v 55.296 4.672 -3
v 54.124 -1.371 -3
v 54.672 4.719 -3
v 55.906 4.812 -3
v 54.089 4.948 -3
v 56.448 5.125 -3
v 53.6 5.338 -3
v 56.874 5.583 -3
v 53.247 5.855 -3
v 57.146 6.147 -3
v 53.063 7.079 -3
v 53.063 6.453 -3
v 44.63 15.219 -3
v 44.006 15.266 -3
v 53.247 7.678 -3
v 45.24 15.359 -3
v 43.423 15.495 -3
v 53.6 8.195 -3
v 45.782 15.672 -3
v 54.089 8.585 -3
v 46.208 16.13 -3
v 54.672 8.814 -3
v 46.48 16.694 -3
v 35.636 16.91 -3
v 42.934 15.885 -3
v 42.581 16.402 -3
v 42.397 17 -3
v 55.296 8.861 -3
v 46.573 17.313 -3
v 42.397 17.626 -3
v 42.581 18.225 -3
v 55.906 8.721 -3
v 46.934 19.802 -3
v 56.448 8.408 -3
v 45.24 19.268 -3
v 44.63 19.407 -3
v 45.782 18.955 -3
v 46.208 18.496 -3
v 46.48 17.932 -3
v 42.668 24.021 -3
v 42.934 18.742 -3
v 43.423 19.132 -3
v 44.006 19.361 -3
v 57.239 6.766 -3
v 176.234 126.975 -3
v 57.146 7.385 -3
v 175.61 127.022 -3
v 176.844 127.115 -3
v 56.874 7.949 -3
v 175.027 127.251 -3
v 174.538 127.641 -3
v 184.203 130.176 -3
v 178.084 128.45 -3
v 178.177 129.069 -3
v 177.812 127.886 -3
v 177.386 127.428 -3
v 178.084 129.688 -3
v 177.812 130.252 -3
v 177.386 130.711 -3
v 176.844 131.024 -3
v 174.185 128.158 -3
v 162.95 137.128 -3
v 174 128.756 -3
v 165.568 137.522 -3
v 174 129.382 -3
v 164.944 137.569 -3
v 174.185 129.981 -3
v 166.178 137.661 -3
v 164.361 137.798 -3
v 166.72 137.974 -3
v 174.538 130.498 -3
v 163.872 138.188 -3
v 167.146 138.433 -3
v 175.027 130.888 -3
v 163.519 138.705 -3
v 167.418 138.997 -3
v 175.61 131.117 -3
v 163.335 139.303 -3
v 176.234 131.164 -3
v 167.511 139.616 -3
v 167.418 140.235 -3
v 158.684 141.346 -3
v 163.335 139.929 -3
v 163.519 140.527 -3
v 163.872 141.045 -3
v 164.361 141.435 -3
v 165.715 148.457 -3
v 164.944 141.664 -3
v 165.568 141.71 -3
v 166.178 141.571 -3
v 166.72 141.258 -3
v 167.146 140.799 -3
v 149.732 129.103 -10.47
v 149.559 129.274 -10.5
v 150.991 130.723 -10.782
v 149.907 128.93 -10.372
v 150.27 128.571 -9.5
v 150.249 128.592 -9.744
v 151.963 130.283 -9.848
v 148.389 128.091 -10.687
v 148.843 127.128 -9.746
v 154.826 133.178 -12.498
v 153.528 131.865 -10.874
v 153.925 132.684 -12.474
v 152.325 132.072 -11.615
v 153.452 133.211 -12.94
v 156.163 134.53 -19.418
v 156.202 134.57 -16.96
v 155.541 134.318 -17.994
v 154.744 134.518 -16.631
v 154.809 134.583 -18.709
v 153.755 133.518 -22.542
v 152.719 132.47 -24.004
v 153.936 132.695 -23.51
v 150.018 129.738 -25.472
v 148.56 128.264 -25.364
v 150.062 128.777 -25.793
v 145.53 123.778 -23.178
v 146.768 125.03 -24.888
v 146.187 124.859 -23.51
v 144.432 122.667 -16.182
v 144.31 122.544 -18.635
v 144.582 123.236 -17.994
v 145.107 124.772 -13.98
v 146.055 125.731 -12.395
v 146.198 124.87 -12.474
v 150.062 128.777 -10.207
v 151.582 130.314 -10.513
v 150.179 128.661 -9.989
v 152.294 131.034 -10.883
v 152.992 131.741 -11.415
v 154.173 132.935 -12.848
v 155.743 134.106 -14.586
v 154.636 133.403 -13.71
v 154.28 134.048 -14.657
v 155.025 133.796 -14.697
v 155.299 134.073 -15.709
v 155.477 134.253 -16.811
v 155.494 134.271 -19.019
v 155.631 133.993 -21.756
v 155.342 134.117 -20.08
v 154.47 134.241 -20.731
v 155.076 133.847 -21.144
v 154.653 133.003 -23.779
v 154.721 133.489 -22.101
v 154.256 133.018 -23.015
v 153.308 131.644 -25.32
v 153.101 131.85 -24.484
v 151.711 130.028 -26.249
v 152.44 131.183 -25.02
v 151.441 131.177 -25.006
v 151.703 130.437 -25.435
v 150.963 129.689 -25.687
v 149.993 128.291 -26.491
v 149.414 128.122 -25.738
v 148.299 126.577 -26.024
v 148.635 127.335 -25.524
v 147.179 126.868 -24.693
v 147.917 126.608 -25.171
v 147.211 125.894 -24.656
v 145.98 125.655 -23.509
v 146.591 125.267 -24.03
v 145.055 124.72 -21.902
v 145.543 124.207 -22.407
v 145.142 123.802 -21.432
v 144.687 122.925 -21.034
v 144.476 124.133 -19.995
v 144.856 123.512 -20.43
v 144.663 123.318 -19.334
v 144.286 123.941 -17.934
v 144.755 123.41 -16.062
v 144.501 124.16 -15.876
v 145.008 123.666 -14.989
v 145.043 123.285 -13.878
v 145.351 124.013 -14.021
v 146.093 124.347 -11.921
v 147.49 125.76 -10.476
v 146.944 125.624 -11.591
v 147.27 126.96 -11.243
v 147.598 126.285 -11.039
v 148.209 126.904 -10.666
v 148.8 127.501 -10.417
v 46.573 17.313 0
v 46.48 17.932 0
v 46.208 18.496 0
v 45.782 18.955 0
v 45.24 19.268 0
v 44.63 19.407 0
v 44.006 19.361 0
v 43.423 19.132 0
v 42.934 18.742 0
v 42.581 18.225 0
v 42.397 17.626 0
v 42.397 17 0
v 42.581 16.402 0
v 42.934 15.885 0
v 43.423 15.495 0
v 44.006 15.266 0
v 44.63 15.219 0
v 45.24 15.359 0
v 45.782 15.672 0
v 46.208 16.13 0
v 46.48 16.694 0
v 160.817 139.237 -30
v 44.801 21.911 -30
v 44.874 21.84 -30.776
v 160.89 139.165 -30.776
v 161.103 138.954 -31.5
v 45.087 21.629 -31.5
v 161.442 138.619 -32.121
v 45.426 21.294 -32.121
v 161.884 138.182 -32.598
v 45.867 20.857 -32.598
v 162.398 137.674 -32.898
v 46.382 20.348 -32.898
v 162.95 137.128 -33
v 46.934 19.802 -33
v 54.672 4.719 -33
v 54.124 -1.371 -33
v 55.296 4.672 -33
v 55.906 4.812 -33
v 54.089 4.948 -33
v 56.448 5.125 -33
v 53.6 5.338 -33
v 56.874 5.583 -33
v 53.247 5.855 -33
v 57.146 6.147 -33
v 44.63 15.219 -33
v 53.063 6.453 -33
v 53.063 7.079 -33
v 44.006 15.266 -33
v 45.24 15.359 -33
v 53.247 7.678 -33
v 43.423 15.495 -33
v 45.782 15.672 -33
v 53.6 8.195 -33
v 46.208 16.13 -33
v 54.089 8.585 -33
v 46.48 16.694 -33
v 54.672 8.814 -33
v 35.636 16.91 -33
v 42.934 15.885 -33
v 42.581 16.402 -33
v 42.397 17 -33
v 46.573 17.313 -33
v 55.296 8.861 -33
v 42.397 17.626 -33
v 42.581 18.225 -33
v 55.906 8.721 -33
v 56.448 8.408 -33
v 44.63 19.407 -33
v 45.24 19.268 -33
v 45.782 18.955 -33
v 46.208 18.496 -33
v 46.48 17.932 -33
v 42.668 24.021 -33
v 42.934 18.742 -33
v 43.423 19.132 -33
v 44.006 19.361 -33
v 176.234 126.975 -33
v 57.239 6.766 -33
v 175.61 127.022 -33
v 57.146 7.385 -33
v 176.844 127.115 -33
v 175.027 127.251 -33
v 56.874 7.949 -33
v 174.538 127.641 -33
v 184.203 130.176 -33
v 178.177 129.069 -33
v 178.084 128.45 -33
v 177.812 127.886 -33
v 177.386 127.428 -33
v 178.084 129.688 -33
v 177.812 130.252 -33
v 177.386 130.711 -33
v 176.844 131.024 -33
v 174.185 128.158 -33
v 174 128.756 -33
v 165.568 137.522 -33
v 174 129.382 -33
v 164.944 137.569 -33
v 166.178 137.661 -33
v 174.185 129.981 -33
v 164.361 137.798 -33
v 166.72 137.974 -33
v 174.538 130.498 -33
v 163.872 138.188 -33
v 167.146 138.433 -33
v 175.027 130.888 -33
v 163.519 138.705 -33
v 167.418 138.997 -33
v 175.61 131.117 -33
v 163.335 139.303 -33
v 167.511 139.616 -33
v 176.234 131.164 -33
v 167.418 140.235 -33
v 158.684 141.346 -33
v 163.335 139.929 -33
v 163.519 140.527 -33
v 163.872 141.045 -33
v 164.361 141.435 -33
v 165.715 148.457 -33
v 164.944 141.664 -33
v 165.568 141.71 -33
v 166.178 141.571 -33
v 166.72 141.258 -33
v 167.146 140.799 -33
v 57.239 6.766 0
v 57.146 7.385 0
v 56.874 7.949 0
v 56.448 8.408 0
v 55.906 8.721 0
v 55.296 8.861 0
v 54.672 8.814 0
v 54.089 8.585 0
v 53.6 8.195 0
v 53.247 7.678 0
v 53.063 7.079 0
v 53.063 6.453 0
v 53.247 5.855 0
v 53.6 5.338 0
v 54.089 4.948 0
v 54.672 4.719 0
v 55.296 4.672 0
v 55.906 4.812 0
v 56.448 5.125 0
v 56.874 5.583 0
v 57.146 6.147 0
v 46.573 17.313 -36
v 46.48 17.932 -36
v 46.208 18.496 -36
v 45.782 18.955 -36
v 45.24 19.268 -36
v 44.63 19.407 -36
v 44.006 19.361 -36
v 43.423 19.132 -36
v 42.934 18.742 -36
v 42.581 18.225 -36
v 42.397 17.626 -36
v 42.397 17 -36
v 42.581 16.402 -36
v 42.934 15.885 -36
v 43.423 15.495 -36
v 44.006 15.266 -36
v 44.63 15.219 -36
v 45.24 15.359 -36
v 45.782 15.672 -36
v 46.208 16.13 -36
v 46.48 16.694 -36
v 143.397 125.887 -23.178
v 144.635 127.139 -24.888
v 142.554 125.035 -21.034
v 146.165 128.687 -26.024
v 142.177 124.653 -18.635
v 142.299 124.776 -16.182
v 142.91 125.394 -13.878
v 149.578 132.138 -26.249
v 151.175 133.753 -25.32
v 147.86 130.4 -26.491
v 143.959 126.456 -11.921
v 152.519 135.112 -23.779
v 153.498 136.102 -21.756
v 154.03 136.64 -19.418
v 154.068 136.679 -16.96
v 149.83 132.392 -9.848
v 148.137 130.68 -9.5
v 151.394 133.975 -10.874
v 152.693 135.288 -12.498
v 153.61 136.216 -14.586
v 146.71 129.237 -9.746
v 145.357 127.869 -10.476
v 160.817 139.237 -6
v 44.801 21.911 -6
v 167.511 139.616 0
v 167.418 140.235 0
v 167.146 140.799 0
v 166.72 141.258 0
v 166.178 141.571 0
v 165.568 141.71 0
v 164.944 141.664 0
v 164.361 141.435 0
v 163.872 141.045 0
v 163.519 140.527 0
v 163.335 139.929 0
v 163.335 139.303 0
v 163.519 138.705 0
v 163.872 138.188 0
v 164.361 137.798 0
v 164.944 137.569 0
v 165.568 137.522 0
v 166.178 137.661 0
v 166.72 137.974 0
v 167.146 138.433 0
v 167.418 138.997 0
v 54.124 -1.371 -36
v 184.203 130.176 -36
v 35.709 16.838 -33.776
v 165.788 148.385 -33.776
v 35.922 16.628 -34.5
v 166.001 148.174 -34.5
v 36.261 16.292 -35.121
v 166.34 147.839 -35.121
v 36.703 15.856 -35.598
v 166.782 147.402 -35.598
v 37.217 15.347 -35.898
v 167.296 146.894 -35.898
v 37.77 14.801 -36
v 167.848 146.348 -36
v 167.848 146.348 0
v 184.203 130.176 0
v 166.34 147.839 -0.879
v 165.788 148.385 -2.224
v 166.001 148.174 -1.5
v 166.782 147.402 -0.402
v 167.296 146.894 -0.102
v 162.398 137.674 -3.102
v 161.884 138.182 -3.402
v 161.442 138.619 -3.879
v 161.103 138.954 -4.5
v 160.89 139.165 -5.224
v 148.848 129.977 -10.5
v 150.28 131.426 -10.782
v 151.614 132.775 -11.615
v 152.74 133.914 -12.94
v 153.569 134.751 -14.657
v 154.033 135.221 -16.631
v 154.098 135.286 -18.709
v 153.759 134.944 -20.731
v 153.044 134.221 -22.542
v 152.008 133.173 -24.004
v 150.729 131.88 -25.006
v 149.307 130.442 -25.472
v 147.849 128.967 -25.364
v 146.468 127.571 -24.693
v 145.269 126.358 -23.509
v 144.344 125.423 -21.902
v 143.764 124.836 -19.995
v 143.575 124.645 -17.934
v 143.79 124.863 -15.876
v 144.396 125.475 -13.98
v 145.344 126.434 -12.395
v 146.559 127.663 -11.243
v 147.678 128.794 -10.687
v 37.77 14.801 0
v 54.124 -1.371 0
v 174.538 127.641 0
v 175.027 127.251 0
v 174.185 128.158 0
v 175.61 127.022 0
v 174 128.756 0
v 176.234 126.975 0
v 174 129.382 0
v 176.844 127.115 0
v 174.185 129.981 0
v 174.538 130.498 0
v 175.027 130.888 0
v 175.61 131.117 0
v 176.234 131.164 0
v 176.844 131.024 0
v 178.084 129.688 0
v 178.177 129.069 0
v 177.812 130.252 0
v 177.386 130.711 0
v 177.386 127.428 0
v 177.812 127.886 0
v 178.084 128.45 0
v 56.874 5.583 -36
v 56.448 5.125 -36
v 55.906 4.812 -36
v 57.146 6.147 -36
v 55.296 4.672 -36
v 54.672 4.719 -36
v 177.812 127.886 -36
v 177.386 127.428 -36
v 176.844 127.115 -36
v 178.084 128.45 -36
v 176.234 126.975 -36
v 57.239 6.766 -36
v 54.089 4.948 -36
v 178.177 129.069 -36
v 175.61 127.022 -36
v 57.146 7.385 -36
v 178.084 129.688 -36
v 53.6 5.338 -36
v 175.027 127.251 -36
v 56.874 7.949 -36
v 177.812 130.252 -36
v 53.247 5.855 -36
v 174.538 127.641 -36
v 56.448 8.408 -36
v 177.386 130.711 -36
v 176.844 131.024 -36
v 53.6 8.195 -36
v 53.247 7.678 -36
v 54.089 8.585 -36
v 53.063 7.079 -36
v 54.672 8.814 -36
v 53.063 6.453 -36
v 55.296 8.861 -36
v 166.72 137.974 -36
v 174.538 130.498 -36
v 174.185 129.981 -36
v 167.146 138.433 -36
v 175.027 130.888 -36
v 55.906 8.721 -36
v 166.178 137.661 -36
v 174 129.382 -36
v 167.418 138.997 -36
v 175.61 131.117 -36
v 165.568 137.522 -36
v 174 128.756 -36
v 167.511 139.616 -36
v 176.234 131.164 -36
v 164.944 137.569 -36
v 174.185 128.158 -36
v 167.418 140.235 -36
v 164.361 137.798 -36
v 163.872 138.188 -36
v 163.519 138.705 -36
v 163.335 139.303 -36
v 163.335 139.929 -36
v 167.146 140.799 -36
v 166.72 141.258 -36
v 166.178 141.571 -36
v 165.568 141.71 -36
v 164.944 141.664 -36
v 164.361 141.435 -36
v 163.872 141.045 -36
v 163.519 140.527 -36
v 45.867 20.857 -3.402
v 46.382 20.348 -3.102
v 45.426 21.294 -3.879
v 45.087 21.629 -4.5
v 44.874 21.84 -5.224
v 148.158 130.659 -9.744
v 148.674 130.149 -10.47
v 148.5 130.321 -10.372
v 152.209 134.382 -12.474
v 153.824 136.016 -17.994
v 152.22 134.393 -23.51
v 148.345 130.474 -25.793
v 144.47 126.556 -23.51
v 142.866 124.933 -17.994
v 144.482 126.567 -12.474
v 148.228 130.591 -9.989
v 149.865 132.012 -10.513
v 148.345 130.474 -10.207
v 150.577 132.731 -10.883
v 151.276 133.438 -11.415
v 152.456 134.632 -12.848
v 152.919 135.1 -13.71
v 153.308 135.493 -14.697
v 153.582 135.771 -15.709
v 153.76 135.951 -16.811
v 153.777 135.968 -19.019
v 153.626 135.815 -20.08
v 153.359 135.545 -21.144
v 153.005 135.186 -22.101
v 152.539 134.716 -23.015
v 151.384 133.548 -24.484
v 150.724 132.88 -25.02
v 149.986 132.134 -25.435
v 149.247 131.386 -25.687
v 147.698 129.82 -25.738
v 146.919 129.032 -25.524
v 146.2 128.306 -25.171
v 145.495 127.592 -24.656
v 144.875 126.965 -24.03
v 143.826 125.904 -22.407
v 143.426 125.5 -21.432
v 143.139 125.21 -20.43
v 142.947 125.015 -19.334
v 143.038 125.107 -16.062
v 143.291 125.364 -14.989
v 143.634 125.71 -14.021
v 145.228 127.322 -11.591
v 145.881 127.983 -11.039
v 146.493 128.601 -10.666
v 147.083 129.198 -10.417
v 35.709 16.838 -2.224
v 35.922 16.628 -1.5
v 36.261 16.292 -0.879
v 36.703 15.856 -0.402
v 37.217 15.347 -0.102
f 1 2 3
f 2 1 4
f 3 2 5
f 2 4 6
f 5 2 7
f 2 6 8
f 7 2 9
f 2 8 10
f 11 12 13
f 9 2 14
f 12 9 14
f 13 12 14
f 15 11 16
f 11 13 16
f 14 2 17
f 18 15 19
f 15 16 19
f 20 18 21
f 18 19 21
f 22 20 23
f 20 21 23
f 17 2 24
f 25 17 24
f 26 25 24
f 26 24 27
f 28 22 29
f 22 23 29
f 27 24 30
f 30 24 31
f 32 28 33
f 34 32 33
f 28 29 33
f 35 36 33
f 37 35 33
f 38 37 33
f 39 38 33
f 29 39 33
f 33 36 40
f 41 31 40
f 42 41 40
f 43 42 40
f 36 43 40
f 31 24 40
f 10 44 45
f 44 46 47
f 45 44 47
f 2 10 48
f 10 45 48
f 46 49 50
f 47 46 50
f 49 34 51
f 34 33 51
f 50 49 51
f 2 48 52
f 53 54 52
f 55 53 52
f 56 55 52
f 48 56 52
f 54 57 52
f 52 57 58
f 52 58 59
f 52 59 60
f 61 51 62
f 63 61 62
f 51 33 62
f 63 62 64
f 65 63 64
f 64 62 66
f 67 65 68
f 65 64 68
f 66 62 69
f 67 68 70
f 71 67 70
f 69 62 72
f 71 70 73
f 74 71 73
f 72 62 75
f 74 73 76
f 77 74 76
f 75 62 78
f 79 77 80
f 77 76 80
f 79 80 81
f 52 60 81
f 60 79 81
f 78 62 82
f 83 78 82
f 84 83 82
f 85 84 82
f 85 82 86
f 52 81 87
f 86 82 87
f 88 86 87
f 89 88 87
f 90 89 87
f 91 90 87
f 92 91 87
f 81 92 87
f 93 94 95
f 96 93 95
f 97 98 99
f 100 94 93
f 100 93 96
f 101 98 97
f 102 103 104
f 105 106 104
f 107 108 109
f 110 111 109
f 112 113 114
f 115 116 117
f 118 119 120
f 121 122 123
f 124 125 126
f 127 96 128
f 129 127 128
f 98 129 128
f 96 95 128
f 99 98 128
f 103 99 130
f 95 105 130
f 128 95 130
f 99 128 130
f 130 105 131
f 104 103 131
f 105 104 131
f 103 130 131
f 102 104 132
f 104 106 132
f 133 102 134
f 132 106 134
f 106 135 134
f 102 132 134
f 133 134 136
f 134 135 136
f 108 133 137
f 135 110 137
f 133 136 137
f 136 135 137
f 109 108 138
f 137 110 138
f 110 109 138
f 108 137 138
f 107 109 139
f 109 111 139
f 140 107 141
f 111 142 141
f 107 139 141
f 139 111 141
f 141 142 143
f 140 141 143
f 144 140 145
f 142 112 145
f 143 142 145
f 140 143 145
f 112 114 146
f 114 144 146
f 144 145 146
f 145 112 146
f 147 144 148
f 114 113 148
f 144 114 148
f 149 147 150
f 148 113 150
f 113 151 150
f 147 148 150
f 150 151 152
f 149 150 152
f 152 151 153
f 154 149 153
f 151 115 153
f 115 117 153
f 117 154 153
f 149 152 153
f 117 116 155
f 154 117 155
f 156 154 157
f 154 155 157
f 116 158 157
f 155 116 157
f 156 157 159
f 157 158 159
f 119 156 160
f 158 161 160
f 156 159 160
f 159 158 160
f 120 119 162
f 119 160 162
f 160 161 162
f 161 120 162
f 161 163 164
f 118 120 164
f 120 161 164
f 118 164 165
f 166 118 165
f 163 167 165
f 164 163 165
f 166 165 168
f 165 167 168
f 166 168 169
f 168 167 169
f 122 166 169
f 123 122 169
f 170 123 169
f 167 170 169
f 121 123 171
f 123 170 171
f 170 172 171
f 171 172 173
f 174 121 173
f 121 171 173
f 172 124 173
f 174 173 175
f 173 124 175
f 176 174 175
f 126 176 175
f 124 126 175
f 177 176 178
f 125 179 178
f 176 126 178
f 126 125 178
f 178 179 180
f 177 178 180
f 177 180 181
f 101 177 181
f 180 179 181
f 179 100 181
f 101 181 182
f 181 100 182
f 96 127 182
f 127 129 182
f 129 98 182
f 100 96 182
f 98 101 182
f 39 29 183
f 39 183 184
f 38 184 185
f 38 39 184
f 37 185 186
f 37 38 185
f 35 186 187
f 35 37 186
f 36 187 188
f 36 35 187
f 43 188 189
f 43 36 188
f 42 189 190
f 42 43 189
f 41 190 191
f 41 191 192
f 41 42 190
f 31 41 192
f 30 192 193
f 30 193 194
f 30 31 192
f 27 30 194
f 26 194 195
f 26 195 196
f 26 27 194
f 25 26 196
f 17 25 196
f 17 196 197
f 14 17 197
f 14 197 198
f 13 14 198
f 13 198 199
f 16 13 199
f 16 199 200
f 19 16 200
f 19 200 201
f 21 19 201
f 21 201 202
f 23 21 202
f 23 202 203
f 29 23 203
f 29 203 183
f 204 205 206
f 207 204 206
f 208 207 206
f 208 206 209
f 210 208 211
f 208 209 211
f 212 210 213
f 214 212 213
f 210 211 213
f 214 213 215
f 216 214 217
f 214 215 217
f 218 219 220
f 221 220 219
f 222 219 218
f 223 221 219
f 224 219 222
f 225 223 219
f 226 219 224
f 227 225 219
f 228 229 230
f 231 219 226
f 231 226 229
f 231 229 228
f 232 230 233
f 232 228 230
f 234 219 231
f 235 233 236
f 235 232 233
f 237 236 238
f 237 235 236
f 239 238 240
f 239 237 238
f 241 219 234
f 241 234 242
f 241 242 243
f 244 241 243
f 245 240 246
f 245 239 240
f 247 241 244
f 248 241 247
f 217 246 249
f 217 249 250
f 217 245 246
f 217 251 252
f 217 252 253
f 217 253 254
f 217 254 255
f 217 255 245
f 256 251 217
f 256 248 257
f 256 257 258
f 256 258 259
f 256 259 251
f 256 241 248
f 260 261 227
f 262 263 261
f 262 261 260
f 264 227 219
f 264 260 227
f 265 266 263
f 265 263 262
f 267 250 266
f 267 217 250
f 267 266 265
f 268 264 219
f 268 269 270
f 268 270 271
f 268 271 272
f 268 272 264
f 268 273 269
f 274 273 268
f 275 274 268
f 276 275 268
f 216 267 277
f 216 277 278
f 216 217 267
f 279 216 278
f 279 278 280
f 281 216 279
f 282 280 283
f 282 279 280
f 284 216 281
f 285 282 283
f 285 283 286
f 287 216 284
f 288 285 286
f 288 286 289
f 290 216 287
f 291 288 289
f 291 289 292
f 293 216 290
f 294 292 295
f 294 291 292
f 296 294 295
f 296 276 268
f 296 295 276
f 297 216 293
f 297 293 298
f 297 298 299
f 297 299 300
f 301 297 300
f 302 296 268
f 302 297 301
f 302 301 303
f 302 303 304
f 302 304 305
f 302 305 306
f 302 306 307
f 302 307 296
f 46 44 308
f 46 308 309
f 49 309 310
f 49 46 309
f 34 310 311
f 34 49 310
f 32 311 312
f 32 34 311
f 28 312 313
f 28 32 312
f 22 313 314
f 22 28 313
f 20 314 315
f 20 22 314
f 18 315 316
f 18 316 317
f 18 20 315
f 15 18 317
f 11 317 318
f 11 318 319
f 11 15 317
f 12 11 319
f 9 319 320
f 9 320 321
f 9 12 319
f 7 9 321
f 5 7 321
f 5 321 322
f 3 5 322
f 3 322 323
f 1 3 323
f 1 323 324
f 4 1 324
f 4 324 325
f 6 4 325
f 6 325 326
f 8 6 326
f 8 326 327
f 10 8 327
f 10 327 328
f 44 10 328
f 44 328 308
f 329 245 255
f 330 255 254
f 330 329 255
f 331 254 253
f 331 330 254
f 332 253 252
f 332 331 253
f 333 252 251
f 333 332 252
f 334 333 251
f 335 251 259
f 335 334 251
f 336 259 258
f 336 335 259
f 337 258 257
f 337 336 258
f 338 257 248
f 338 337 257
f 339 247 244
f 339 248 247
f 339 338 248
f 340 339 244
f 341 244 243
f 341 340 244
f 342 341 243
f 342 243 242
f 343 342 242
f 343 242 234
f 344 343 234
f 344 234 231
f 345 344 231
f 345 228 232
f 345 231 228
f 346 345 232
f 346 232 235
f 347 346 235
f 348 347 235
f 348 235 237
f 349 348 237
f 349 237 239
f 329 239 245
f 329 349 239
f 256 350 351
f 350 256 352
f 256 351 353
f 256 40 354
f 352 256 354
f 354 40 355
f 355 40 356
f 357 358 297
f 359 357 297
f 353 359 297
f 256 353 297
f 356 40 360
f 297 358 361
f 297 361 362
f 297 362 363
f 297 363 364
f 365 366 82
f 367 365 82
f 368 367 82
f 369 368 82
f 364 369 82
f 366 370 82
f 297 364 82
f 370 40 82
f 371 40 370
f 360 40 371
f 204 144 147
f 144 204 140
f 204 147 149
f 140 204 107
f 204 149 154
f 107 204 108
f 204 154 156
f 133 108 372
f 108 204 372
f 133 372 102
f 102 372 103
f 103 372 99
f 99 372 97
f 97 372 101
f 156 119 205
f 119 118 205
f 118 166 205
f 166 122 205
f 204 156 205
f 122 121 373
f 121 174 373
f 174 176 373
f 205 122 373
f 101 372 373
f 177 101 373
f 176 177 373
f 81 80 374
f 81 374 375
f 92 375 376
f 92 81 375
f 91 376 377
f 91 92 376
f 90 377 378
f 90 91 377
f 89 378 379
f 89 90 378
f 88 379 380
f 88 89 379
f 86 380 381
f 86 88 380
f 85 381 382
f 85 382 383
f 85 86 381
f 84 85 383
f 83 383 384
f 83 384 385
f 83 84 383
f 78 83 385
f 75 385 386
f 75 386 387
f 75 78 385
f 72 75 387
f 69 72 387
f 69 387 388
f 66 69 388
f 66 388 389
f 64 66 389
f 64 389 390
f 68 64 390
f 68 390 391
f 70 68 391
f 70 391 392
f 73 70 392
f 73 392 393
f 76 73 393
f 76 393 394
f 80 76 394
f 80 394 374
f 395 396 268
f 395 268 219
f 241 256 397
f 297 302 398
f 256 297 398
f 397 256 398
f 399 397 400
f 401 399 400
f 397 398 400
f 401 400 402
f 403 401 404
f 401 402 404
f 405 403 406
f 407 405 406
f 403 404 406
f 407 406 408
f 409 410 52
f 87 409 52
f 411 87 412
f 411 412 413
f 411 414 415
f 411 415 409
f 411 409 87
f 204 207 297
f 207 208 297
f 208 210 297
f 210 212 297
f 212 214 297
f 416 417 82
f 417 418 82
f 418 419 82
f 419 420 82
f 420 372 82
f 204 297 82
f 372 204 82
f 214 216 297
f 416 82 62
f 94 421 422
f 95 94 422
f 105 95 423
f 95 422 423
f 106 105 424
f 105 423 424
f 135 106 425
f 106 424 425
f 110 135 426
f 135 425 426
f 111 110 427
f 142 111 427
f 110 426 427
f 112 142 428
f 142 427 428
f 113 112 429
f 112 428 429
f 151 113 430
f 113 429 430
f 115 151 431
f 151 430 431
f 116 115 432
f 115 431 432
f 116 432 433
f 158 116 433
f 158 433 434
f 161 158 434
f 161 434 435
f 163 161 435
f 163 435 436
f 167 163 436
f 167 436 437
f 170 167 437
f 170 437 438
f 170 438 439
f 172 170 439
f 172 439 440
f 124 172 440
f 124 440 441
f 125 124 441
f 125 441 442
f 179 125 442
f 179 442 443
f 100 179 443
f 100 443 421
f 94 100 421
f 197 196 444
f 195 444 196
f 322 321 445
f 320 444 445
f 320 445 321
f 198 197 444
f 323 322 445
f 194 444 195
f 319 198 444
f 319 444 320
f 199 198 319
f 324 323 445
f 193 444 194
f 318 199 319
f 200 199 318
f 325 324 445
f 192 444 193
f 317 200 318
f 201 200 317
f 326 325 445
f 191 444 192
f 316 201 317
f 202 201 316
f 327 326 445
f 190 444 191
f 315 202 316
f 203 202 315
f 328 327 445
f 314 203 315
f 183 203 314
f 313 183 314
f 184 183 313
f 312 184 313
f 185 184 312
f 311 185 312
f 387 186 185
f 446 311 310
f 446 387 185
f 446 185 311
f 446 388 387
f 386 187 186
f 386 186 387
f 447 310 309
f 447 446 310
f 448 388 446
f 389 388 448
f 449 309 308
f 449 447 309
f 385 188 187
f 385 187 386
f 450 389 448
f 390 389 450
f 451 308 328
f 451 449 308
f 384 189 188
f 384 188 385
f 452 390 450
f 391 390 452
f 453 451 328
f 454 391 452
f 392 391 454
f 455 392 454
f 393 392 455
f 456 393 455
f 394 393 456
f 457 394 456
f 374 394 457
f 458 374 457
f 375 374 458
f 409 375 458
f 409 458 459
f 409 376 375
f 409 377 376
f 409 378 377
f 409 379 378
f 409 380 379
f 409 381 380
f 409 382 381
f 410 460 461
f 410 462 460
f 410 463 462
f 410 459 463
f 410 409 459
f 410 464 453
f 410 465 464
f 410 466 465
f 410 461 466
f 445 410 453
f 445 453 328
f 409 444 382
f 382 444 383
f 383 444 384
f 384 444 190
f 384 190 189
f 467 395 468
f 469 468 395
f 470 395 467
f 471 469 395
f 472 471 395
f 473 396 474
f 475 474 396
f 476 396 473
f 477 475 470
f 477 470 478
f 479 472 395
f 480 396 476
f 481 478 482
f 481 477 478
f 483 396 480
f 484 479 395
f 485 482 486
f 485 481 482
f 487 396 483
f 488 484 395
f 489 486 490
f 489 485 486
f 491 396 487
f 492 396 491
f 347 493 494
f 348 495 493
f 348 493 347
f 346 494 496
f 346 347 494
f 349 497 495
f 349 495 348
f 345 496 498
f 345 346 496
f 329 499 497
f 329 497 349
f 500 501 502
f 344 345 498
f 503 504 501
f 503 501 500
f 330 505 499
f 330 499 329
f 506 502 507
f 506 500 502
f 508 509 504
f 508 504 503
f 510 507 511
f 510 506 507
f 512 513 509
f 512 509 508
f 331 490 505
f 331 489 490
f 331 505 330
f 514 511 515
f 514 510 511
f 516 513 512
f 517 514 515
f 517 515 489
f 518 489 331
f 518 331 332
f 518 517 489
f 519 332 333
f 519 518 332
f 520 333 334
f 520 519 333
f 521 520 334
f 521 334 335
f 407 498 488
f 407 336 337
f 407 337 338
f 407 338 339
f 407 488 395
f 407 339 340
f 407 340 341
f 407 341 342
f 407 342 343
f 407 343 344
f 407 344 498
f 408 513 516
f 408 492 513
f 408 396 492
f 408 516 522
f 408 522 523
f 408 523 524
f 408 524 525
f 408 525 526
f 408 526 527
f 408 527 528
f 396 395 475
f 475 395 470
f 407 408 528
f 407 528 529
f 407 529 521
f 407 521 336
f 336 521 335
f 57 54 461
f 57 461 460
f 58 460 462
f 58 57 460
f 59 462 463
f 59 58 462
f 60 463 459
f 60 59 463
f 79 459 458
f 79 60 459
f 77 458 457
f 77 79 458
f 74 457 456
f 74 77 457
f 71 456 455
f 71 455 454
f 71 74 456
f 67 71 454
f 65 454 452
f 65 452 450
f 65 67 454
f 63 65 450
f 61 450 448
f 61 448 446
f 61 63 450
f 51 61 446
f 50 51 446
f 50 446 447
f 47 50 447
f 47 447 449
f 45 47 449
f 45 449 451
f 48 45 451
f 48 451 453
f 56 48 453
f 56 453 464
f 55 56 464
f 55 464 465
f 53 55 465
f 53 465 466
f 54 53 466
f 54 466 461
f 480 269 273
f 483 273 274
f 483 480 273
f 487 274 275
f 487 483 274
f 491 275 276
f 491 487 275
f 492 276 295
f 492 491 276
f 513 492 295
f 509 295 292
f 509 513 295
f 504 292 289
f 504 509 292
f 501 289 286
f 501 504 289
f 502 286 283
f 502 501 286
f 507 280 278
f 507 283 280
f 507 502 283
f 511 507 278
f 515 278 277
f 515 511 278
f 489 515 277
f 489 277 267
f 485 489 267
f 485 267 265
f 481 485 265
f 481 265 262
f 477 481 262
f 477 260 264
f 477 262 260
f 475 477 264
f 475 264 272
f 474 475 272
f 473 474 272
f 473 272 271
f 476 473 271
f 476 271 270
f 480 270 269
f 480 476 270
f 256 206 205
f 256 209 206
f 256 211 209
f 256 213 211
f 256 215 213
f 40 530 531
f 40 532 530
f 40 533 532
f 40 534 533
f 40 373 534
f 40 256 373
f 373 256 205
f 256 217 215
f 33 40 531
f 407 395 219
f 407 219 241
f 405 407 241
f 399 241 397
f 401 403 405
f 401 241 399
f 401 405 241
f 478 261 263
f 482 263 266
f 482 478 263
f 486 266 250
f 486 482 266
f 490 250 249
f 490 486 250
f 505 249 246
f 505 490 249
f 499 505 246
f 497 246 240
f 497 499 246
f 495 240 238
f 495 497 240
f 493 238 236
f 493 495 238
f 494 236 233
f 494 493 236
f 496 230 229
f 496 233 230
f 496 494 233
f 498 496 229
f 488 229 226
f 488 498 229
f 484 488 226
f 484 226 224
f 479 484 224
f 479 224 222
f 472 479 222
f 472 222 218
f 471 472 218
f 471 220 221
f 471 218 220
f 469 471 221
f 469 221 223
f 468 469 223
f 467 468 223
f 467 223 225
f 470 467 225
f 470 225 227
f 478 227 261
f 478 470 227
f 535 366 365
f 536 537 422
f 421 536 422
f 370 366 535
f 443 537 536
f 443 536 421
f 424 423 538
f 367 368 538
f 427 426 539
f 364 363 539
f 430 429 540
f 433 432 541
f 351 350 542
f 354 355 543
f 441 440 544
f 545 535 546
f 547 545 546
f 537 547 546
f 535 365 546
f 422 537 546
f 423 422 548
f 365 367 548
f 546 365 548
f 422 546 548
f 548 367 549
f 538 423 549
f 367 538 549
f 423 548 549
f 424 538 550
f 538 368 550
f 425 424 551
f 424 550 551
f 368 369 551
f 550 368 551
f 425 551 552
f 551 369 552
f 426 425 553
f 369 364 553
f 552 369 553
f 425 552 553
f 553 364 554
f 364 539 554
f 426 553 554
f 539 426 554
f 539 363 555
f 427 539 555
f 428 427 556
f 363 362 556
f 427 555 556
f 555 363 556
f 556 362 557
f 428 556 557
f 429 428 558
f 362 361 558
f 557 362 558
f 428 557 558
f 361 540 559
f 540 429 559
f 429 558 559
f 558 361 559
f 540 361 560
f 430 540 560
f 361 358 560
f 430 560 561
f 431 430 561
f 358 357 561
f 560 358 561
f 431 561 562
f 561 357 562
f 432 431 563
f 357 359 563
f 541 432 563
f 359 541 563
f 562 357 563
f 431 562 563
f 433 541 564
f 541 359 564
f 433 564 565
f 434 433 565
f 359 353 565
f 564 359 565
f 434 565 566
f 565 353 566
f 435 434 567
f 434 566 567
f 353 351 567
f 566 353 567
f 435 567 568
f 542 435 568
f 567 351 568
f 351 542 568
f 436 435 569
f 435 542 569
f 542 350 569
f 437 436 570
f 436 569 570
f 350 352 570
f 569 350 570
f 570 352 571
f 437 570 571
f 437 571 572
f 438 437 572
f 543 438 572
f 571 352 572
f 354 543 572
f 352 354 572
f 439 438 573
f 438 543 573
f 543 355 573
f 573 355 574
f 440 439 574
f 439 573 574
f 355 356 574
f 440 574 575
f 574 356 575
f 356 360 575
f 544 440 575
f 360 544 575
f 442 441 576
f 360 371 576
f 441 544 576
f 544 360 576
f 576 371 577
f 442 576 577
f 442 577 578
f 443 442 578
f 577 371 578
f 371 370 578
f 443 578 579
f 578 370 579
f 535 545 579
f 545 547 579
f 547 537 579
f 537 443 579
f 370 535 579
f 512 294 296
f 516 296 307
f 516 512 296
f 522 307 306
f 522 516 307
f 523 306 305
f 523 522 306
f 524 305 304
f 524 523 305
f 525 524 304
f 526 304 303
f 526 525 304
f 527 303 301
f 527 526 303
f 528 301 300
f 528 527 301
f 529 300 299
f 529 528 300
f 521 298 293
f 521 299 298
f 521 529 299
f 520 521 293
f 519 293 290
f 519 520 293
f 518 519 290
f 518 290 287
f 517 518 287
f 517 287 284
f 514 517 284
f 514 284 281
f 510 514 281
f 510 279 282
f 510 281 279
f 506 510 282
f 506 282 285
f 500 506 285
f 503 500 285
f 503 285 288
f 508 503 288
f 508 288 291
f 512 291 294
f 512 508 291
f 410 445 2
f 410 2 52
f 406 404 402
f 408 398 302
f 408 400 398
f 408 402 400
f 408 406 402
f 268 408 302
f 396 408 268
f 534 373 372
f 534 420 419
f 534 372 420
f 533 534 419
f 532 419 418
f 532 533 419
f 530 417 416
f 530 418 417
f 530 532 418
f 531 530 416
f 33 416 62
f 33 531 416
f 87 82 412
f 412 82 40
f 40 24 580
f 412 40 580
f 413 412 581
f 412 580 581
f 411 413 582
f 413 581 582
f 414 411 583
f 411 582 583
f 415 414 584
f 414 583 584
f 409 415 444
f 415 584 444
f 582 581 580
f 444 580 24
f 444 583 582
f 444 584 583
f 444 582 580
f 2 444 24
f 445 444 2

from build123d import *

# Parameters (mm, degrees)
BOSS_EXTRUDE1_DEPTH = 3
BOSS_EXTRUDE2_DEPTH = 3
BOSS_EXTRUDE3_DEPTH = 30
FILLET1_R           = 3
CUT_EXTRUDE1_REACH  = 120.494
SKETCH6_R           = 7.5
CUT_EXTRUDE2_REACH  = 120.494
SKETCH7_W           = 30
SKETCH7_H           = 10
CUT_EXTRUDE3_START  = -36
SKETCH8_R           = 2.1
CUT_EXTRUDE3_DEPTH  = 36
FILLET2_R           = 1


with BuildPart() as part:
    # Sketch2 → Boss-Extrude1 (new body)
    with BuildSketch(Plane.XY):
        Polygon((165.715003736, 148.457007378), (35.636413421, 16.910208322), (54.124071667, -1.371107074), (184.202661981, 130.175691982), align=None)
    extrude(amount=-BOSS_EXTRUDE1_DEPTH)



with BuildPart() as body_2:
    # Sketch4 → Boss-Extrude2 (new body)
    with BuildSketch(Plane(origin=(0, 0, -36), x_dir=(-1, 0, 0), z_dir=(0, 0, -1))):
        Polygon((-165.715003736, 148.457007378), (-184.202661981, 130.175691982), (-54.124071667, -1.371107074), (-35.636413421, 16.910208322), align=None)
    extrude(amount=-BOSS_EXTRUDE2_DEPTH)


with BuildPart() as part_1:
    add(part.part)

    add(body_2.part)  # Boss-Extrude3 merges body 2
    # Sketch5 → Boss-Extrude3 (add)
    with BuildSketch(Plane(origin=(0, 0, -3), x_dir=(-1, 0, 0), z_dir=(0, 0, -1))):
        Polygon((-35.636413421, 16.910208322), (-165.715003736, 148.457007378), (-167.848195072, 146.347624832), (-37.769604757, 14.800825776), align=None)
    extrude(amount=BOSS_EXTRUDE3_DEPTH)

    # Fillet1
    fillet1_edges = [part_1.edges().sort_by_distance(p)[0] for p in [
        (100.675708579, 82.68360785, -36),
        (102.808899915, 80.574225304, -33),
        (102.808899915, 80.574225304, -3),
        (100.675708579, 82.68360785, 0),
    ]]
    fillet(fillet1_edges, radius=FILLET1_R)

    # Sketch6 → Cut-Extrude1 (cut, up to next)
    with BuildSketch(Plane(origin=(9.563615855, -9.456875254, 0), x_dir=(0, 0, 1), z_dir=(-0.711063779, 0.703127515, 0)), mode=Mode.PRIVATE) as cut_extrude1_sk1:
        with Locations((-18, 197.081179448)):
            Circle(SKETCH6_R)
    cut_extrude1_tool1 = extrude(cut_extrude1_sk1.sketch, amount=-CUT_EXTRUDE1_REACH, mode=Mode.PRIVATE) & part_1.part
    add(cut_extrude1_tool1.solids().sort_by_distance((148.136816, 130.680413, -18))[0], mode=Mode.SUBTRACT)

    # Sketch7 → Cut-Extrude2 (cut, up to next)
    with BuildSketch(Plane(origin=(9.563615855, -9.456875254, 0), x_dir=(0, 0, 1), z_dir=(-0.711063779, 0.703127515, 0)), mode=Mode.PRIVATE) as cut_extrude2_sk1:
        with Locations((-18, 217.081179448)):
            Rectangle(SKETCH7_W, SKETCH7_H)
    cut_extrude2_tool1 = extrude(cut_extrude2_sk1.sketch, amount=-CUT_EXTRUDE2_REACH, mode=Mode.PRIVATE) & part_1.part
    add(cut_extrude2_tool1.solids().sort_by_distance((162.199366, 144.901688, -18))[0], mode=Mode.SUBTRACT)
    # Sketch7 → Cut-Extrude2 (cut, up to next)
    with BuildSketch(Plane(origin=(9.563615855, -9.456875254, 0), x_dir=(0, 0, 1), z_dir=(-0.711063779, 0.703127515, 0)), mode=Mode.PRIVATE) as cut_extrude2_sk2:
        with Locations((-18, 42.081179448)):
            Rectangle(SKETCH7_W, SKETCH7_H)
    cut_extrude2_tool2 = extrude(cut_extrude2_sk2.sketch, amount=-CUT_EXTRUDE2_REACH, mode=Mode.PRIVATE) & part_1.part
    add(cut_extrude2_tool2.solids().sort_by_distance((39.152051, 20.465527, -18))[0], mode=Mode.SUBTRACT)

    # Sketch8 → Cut-Extrude3 (cut)
    with BuildSketch(Plane.XY.offset(CUT_EXTRUDE3_START)):
        with Locations((176.077014239, 129.069414997)):
            Circle(SKETCH8_R)
        with Locations((165.411057559, 139.616327725)):
            Circle(SKETCH8_R)
        with Locations((44.473124942, 17.313357792)):
            Circle(SKETCH8_R)
        with Locations((55.139081623, 6.766445064)):
            Circle(SKETCH8_R)
    extrude(amount=CUT_EXTRUDE3_DEPTH, mode=Mode.SUBTRACT)

    # Fillet2
    fillet2_edges = [part_1.edges().sort_by_distance(p)[0] for p in [
        (148.136815855, 130.680412911, -25.5),
        (150.270007192, 128.571030365, -25.5),
    ]]
    fillet(fillet2_edges, radius=FILLET2_R)


solid = part_1.part
